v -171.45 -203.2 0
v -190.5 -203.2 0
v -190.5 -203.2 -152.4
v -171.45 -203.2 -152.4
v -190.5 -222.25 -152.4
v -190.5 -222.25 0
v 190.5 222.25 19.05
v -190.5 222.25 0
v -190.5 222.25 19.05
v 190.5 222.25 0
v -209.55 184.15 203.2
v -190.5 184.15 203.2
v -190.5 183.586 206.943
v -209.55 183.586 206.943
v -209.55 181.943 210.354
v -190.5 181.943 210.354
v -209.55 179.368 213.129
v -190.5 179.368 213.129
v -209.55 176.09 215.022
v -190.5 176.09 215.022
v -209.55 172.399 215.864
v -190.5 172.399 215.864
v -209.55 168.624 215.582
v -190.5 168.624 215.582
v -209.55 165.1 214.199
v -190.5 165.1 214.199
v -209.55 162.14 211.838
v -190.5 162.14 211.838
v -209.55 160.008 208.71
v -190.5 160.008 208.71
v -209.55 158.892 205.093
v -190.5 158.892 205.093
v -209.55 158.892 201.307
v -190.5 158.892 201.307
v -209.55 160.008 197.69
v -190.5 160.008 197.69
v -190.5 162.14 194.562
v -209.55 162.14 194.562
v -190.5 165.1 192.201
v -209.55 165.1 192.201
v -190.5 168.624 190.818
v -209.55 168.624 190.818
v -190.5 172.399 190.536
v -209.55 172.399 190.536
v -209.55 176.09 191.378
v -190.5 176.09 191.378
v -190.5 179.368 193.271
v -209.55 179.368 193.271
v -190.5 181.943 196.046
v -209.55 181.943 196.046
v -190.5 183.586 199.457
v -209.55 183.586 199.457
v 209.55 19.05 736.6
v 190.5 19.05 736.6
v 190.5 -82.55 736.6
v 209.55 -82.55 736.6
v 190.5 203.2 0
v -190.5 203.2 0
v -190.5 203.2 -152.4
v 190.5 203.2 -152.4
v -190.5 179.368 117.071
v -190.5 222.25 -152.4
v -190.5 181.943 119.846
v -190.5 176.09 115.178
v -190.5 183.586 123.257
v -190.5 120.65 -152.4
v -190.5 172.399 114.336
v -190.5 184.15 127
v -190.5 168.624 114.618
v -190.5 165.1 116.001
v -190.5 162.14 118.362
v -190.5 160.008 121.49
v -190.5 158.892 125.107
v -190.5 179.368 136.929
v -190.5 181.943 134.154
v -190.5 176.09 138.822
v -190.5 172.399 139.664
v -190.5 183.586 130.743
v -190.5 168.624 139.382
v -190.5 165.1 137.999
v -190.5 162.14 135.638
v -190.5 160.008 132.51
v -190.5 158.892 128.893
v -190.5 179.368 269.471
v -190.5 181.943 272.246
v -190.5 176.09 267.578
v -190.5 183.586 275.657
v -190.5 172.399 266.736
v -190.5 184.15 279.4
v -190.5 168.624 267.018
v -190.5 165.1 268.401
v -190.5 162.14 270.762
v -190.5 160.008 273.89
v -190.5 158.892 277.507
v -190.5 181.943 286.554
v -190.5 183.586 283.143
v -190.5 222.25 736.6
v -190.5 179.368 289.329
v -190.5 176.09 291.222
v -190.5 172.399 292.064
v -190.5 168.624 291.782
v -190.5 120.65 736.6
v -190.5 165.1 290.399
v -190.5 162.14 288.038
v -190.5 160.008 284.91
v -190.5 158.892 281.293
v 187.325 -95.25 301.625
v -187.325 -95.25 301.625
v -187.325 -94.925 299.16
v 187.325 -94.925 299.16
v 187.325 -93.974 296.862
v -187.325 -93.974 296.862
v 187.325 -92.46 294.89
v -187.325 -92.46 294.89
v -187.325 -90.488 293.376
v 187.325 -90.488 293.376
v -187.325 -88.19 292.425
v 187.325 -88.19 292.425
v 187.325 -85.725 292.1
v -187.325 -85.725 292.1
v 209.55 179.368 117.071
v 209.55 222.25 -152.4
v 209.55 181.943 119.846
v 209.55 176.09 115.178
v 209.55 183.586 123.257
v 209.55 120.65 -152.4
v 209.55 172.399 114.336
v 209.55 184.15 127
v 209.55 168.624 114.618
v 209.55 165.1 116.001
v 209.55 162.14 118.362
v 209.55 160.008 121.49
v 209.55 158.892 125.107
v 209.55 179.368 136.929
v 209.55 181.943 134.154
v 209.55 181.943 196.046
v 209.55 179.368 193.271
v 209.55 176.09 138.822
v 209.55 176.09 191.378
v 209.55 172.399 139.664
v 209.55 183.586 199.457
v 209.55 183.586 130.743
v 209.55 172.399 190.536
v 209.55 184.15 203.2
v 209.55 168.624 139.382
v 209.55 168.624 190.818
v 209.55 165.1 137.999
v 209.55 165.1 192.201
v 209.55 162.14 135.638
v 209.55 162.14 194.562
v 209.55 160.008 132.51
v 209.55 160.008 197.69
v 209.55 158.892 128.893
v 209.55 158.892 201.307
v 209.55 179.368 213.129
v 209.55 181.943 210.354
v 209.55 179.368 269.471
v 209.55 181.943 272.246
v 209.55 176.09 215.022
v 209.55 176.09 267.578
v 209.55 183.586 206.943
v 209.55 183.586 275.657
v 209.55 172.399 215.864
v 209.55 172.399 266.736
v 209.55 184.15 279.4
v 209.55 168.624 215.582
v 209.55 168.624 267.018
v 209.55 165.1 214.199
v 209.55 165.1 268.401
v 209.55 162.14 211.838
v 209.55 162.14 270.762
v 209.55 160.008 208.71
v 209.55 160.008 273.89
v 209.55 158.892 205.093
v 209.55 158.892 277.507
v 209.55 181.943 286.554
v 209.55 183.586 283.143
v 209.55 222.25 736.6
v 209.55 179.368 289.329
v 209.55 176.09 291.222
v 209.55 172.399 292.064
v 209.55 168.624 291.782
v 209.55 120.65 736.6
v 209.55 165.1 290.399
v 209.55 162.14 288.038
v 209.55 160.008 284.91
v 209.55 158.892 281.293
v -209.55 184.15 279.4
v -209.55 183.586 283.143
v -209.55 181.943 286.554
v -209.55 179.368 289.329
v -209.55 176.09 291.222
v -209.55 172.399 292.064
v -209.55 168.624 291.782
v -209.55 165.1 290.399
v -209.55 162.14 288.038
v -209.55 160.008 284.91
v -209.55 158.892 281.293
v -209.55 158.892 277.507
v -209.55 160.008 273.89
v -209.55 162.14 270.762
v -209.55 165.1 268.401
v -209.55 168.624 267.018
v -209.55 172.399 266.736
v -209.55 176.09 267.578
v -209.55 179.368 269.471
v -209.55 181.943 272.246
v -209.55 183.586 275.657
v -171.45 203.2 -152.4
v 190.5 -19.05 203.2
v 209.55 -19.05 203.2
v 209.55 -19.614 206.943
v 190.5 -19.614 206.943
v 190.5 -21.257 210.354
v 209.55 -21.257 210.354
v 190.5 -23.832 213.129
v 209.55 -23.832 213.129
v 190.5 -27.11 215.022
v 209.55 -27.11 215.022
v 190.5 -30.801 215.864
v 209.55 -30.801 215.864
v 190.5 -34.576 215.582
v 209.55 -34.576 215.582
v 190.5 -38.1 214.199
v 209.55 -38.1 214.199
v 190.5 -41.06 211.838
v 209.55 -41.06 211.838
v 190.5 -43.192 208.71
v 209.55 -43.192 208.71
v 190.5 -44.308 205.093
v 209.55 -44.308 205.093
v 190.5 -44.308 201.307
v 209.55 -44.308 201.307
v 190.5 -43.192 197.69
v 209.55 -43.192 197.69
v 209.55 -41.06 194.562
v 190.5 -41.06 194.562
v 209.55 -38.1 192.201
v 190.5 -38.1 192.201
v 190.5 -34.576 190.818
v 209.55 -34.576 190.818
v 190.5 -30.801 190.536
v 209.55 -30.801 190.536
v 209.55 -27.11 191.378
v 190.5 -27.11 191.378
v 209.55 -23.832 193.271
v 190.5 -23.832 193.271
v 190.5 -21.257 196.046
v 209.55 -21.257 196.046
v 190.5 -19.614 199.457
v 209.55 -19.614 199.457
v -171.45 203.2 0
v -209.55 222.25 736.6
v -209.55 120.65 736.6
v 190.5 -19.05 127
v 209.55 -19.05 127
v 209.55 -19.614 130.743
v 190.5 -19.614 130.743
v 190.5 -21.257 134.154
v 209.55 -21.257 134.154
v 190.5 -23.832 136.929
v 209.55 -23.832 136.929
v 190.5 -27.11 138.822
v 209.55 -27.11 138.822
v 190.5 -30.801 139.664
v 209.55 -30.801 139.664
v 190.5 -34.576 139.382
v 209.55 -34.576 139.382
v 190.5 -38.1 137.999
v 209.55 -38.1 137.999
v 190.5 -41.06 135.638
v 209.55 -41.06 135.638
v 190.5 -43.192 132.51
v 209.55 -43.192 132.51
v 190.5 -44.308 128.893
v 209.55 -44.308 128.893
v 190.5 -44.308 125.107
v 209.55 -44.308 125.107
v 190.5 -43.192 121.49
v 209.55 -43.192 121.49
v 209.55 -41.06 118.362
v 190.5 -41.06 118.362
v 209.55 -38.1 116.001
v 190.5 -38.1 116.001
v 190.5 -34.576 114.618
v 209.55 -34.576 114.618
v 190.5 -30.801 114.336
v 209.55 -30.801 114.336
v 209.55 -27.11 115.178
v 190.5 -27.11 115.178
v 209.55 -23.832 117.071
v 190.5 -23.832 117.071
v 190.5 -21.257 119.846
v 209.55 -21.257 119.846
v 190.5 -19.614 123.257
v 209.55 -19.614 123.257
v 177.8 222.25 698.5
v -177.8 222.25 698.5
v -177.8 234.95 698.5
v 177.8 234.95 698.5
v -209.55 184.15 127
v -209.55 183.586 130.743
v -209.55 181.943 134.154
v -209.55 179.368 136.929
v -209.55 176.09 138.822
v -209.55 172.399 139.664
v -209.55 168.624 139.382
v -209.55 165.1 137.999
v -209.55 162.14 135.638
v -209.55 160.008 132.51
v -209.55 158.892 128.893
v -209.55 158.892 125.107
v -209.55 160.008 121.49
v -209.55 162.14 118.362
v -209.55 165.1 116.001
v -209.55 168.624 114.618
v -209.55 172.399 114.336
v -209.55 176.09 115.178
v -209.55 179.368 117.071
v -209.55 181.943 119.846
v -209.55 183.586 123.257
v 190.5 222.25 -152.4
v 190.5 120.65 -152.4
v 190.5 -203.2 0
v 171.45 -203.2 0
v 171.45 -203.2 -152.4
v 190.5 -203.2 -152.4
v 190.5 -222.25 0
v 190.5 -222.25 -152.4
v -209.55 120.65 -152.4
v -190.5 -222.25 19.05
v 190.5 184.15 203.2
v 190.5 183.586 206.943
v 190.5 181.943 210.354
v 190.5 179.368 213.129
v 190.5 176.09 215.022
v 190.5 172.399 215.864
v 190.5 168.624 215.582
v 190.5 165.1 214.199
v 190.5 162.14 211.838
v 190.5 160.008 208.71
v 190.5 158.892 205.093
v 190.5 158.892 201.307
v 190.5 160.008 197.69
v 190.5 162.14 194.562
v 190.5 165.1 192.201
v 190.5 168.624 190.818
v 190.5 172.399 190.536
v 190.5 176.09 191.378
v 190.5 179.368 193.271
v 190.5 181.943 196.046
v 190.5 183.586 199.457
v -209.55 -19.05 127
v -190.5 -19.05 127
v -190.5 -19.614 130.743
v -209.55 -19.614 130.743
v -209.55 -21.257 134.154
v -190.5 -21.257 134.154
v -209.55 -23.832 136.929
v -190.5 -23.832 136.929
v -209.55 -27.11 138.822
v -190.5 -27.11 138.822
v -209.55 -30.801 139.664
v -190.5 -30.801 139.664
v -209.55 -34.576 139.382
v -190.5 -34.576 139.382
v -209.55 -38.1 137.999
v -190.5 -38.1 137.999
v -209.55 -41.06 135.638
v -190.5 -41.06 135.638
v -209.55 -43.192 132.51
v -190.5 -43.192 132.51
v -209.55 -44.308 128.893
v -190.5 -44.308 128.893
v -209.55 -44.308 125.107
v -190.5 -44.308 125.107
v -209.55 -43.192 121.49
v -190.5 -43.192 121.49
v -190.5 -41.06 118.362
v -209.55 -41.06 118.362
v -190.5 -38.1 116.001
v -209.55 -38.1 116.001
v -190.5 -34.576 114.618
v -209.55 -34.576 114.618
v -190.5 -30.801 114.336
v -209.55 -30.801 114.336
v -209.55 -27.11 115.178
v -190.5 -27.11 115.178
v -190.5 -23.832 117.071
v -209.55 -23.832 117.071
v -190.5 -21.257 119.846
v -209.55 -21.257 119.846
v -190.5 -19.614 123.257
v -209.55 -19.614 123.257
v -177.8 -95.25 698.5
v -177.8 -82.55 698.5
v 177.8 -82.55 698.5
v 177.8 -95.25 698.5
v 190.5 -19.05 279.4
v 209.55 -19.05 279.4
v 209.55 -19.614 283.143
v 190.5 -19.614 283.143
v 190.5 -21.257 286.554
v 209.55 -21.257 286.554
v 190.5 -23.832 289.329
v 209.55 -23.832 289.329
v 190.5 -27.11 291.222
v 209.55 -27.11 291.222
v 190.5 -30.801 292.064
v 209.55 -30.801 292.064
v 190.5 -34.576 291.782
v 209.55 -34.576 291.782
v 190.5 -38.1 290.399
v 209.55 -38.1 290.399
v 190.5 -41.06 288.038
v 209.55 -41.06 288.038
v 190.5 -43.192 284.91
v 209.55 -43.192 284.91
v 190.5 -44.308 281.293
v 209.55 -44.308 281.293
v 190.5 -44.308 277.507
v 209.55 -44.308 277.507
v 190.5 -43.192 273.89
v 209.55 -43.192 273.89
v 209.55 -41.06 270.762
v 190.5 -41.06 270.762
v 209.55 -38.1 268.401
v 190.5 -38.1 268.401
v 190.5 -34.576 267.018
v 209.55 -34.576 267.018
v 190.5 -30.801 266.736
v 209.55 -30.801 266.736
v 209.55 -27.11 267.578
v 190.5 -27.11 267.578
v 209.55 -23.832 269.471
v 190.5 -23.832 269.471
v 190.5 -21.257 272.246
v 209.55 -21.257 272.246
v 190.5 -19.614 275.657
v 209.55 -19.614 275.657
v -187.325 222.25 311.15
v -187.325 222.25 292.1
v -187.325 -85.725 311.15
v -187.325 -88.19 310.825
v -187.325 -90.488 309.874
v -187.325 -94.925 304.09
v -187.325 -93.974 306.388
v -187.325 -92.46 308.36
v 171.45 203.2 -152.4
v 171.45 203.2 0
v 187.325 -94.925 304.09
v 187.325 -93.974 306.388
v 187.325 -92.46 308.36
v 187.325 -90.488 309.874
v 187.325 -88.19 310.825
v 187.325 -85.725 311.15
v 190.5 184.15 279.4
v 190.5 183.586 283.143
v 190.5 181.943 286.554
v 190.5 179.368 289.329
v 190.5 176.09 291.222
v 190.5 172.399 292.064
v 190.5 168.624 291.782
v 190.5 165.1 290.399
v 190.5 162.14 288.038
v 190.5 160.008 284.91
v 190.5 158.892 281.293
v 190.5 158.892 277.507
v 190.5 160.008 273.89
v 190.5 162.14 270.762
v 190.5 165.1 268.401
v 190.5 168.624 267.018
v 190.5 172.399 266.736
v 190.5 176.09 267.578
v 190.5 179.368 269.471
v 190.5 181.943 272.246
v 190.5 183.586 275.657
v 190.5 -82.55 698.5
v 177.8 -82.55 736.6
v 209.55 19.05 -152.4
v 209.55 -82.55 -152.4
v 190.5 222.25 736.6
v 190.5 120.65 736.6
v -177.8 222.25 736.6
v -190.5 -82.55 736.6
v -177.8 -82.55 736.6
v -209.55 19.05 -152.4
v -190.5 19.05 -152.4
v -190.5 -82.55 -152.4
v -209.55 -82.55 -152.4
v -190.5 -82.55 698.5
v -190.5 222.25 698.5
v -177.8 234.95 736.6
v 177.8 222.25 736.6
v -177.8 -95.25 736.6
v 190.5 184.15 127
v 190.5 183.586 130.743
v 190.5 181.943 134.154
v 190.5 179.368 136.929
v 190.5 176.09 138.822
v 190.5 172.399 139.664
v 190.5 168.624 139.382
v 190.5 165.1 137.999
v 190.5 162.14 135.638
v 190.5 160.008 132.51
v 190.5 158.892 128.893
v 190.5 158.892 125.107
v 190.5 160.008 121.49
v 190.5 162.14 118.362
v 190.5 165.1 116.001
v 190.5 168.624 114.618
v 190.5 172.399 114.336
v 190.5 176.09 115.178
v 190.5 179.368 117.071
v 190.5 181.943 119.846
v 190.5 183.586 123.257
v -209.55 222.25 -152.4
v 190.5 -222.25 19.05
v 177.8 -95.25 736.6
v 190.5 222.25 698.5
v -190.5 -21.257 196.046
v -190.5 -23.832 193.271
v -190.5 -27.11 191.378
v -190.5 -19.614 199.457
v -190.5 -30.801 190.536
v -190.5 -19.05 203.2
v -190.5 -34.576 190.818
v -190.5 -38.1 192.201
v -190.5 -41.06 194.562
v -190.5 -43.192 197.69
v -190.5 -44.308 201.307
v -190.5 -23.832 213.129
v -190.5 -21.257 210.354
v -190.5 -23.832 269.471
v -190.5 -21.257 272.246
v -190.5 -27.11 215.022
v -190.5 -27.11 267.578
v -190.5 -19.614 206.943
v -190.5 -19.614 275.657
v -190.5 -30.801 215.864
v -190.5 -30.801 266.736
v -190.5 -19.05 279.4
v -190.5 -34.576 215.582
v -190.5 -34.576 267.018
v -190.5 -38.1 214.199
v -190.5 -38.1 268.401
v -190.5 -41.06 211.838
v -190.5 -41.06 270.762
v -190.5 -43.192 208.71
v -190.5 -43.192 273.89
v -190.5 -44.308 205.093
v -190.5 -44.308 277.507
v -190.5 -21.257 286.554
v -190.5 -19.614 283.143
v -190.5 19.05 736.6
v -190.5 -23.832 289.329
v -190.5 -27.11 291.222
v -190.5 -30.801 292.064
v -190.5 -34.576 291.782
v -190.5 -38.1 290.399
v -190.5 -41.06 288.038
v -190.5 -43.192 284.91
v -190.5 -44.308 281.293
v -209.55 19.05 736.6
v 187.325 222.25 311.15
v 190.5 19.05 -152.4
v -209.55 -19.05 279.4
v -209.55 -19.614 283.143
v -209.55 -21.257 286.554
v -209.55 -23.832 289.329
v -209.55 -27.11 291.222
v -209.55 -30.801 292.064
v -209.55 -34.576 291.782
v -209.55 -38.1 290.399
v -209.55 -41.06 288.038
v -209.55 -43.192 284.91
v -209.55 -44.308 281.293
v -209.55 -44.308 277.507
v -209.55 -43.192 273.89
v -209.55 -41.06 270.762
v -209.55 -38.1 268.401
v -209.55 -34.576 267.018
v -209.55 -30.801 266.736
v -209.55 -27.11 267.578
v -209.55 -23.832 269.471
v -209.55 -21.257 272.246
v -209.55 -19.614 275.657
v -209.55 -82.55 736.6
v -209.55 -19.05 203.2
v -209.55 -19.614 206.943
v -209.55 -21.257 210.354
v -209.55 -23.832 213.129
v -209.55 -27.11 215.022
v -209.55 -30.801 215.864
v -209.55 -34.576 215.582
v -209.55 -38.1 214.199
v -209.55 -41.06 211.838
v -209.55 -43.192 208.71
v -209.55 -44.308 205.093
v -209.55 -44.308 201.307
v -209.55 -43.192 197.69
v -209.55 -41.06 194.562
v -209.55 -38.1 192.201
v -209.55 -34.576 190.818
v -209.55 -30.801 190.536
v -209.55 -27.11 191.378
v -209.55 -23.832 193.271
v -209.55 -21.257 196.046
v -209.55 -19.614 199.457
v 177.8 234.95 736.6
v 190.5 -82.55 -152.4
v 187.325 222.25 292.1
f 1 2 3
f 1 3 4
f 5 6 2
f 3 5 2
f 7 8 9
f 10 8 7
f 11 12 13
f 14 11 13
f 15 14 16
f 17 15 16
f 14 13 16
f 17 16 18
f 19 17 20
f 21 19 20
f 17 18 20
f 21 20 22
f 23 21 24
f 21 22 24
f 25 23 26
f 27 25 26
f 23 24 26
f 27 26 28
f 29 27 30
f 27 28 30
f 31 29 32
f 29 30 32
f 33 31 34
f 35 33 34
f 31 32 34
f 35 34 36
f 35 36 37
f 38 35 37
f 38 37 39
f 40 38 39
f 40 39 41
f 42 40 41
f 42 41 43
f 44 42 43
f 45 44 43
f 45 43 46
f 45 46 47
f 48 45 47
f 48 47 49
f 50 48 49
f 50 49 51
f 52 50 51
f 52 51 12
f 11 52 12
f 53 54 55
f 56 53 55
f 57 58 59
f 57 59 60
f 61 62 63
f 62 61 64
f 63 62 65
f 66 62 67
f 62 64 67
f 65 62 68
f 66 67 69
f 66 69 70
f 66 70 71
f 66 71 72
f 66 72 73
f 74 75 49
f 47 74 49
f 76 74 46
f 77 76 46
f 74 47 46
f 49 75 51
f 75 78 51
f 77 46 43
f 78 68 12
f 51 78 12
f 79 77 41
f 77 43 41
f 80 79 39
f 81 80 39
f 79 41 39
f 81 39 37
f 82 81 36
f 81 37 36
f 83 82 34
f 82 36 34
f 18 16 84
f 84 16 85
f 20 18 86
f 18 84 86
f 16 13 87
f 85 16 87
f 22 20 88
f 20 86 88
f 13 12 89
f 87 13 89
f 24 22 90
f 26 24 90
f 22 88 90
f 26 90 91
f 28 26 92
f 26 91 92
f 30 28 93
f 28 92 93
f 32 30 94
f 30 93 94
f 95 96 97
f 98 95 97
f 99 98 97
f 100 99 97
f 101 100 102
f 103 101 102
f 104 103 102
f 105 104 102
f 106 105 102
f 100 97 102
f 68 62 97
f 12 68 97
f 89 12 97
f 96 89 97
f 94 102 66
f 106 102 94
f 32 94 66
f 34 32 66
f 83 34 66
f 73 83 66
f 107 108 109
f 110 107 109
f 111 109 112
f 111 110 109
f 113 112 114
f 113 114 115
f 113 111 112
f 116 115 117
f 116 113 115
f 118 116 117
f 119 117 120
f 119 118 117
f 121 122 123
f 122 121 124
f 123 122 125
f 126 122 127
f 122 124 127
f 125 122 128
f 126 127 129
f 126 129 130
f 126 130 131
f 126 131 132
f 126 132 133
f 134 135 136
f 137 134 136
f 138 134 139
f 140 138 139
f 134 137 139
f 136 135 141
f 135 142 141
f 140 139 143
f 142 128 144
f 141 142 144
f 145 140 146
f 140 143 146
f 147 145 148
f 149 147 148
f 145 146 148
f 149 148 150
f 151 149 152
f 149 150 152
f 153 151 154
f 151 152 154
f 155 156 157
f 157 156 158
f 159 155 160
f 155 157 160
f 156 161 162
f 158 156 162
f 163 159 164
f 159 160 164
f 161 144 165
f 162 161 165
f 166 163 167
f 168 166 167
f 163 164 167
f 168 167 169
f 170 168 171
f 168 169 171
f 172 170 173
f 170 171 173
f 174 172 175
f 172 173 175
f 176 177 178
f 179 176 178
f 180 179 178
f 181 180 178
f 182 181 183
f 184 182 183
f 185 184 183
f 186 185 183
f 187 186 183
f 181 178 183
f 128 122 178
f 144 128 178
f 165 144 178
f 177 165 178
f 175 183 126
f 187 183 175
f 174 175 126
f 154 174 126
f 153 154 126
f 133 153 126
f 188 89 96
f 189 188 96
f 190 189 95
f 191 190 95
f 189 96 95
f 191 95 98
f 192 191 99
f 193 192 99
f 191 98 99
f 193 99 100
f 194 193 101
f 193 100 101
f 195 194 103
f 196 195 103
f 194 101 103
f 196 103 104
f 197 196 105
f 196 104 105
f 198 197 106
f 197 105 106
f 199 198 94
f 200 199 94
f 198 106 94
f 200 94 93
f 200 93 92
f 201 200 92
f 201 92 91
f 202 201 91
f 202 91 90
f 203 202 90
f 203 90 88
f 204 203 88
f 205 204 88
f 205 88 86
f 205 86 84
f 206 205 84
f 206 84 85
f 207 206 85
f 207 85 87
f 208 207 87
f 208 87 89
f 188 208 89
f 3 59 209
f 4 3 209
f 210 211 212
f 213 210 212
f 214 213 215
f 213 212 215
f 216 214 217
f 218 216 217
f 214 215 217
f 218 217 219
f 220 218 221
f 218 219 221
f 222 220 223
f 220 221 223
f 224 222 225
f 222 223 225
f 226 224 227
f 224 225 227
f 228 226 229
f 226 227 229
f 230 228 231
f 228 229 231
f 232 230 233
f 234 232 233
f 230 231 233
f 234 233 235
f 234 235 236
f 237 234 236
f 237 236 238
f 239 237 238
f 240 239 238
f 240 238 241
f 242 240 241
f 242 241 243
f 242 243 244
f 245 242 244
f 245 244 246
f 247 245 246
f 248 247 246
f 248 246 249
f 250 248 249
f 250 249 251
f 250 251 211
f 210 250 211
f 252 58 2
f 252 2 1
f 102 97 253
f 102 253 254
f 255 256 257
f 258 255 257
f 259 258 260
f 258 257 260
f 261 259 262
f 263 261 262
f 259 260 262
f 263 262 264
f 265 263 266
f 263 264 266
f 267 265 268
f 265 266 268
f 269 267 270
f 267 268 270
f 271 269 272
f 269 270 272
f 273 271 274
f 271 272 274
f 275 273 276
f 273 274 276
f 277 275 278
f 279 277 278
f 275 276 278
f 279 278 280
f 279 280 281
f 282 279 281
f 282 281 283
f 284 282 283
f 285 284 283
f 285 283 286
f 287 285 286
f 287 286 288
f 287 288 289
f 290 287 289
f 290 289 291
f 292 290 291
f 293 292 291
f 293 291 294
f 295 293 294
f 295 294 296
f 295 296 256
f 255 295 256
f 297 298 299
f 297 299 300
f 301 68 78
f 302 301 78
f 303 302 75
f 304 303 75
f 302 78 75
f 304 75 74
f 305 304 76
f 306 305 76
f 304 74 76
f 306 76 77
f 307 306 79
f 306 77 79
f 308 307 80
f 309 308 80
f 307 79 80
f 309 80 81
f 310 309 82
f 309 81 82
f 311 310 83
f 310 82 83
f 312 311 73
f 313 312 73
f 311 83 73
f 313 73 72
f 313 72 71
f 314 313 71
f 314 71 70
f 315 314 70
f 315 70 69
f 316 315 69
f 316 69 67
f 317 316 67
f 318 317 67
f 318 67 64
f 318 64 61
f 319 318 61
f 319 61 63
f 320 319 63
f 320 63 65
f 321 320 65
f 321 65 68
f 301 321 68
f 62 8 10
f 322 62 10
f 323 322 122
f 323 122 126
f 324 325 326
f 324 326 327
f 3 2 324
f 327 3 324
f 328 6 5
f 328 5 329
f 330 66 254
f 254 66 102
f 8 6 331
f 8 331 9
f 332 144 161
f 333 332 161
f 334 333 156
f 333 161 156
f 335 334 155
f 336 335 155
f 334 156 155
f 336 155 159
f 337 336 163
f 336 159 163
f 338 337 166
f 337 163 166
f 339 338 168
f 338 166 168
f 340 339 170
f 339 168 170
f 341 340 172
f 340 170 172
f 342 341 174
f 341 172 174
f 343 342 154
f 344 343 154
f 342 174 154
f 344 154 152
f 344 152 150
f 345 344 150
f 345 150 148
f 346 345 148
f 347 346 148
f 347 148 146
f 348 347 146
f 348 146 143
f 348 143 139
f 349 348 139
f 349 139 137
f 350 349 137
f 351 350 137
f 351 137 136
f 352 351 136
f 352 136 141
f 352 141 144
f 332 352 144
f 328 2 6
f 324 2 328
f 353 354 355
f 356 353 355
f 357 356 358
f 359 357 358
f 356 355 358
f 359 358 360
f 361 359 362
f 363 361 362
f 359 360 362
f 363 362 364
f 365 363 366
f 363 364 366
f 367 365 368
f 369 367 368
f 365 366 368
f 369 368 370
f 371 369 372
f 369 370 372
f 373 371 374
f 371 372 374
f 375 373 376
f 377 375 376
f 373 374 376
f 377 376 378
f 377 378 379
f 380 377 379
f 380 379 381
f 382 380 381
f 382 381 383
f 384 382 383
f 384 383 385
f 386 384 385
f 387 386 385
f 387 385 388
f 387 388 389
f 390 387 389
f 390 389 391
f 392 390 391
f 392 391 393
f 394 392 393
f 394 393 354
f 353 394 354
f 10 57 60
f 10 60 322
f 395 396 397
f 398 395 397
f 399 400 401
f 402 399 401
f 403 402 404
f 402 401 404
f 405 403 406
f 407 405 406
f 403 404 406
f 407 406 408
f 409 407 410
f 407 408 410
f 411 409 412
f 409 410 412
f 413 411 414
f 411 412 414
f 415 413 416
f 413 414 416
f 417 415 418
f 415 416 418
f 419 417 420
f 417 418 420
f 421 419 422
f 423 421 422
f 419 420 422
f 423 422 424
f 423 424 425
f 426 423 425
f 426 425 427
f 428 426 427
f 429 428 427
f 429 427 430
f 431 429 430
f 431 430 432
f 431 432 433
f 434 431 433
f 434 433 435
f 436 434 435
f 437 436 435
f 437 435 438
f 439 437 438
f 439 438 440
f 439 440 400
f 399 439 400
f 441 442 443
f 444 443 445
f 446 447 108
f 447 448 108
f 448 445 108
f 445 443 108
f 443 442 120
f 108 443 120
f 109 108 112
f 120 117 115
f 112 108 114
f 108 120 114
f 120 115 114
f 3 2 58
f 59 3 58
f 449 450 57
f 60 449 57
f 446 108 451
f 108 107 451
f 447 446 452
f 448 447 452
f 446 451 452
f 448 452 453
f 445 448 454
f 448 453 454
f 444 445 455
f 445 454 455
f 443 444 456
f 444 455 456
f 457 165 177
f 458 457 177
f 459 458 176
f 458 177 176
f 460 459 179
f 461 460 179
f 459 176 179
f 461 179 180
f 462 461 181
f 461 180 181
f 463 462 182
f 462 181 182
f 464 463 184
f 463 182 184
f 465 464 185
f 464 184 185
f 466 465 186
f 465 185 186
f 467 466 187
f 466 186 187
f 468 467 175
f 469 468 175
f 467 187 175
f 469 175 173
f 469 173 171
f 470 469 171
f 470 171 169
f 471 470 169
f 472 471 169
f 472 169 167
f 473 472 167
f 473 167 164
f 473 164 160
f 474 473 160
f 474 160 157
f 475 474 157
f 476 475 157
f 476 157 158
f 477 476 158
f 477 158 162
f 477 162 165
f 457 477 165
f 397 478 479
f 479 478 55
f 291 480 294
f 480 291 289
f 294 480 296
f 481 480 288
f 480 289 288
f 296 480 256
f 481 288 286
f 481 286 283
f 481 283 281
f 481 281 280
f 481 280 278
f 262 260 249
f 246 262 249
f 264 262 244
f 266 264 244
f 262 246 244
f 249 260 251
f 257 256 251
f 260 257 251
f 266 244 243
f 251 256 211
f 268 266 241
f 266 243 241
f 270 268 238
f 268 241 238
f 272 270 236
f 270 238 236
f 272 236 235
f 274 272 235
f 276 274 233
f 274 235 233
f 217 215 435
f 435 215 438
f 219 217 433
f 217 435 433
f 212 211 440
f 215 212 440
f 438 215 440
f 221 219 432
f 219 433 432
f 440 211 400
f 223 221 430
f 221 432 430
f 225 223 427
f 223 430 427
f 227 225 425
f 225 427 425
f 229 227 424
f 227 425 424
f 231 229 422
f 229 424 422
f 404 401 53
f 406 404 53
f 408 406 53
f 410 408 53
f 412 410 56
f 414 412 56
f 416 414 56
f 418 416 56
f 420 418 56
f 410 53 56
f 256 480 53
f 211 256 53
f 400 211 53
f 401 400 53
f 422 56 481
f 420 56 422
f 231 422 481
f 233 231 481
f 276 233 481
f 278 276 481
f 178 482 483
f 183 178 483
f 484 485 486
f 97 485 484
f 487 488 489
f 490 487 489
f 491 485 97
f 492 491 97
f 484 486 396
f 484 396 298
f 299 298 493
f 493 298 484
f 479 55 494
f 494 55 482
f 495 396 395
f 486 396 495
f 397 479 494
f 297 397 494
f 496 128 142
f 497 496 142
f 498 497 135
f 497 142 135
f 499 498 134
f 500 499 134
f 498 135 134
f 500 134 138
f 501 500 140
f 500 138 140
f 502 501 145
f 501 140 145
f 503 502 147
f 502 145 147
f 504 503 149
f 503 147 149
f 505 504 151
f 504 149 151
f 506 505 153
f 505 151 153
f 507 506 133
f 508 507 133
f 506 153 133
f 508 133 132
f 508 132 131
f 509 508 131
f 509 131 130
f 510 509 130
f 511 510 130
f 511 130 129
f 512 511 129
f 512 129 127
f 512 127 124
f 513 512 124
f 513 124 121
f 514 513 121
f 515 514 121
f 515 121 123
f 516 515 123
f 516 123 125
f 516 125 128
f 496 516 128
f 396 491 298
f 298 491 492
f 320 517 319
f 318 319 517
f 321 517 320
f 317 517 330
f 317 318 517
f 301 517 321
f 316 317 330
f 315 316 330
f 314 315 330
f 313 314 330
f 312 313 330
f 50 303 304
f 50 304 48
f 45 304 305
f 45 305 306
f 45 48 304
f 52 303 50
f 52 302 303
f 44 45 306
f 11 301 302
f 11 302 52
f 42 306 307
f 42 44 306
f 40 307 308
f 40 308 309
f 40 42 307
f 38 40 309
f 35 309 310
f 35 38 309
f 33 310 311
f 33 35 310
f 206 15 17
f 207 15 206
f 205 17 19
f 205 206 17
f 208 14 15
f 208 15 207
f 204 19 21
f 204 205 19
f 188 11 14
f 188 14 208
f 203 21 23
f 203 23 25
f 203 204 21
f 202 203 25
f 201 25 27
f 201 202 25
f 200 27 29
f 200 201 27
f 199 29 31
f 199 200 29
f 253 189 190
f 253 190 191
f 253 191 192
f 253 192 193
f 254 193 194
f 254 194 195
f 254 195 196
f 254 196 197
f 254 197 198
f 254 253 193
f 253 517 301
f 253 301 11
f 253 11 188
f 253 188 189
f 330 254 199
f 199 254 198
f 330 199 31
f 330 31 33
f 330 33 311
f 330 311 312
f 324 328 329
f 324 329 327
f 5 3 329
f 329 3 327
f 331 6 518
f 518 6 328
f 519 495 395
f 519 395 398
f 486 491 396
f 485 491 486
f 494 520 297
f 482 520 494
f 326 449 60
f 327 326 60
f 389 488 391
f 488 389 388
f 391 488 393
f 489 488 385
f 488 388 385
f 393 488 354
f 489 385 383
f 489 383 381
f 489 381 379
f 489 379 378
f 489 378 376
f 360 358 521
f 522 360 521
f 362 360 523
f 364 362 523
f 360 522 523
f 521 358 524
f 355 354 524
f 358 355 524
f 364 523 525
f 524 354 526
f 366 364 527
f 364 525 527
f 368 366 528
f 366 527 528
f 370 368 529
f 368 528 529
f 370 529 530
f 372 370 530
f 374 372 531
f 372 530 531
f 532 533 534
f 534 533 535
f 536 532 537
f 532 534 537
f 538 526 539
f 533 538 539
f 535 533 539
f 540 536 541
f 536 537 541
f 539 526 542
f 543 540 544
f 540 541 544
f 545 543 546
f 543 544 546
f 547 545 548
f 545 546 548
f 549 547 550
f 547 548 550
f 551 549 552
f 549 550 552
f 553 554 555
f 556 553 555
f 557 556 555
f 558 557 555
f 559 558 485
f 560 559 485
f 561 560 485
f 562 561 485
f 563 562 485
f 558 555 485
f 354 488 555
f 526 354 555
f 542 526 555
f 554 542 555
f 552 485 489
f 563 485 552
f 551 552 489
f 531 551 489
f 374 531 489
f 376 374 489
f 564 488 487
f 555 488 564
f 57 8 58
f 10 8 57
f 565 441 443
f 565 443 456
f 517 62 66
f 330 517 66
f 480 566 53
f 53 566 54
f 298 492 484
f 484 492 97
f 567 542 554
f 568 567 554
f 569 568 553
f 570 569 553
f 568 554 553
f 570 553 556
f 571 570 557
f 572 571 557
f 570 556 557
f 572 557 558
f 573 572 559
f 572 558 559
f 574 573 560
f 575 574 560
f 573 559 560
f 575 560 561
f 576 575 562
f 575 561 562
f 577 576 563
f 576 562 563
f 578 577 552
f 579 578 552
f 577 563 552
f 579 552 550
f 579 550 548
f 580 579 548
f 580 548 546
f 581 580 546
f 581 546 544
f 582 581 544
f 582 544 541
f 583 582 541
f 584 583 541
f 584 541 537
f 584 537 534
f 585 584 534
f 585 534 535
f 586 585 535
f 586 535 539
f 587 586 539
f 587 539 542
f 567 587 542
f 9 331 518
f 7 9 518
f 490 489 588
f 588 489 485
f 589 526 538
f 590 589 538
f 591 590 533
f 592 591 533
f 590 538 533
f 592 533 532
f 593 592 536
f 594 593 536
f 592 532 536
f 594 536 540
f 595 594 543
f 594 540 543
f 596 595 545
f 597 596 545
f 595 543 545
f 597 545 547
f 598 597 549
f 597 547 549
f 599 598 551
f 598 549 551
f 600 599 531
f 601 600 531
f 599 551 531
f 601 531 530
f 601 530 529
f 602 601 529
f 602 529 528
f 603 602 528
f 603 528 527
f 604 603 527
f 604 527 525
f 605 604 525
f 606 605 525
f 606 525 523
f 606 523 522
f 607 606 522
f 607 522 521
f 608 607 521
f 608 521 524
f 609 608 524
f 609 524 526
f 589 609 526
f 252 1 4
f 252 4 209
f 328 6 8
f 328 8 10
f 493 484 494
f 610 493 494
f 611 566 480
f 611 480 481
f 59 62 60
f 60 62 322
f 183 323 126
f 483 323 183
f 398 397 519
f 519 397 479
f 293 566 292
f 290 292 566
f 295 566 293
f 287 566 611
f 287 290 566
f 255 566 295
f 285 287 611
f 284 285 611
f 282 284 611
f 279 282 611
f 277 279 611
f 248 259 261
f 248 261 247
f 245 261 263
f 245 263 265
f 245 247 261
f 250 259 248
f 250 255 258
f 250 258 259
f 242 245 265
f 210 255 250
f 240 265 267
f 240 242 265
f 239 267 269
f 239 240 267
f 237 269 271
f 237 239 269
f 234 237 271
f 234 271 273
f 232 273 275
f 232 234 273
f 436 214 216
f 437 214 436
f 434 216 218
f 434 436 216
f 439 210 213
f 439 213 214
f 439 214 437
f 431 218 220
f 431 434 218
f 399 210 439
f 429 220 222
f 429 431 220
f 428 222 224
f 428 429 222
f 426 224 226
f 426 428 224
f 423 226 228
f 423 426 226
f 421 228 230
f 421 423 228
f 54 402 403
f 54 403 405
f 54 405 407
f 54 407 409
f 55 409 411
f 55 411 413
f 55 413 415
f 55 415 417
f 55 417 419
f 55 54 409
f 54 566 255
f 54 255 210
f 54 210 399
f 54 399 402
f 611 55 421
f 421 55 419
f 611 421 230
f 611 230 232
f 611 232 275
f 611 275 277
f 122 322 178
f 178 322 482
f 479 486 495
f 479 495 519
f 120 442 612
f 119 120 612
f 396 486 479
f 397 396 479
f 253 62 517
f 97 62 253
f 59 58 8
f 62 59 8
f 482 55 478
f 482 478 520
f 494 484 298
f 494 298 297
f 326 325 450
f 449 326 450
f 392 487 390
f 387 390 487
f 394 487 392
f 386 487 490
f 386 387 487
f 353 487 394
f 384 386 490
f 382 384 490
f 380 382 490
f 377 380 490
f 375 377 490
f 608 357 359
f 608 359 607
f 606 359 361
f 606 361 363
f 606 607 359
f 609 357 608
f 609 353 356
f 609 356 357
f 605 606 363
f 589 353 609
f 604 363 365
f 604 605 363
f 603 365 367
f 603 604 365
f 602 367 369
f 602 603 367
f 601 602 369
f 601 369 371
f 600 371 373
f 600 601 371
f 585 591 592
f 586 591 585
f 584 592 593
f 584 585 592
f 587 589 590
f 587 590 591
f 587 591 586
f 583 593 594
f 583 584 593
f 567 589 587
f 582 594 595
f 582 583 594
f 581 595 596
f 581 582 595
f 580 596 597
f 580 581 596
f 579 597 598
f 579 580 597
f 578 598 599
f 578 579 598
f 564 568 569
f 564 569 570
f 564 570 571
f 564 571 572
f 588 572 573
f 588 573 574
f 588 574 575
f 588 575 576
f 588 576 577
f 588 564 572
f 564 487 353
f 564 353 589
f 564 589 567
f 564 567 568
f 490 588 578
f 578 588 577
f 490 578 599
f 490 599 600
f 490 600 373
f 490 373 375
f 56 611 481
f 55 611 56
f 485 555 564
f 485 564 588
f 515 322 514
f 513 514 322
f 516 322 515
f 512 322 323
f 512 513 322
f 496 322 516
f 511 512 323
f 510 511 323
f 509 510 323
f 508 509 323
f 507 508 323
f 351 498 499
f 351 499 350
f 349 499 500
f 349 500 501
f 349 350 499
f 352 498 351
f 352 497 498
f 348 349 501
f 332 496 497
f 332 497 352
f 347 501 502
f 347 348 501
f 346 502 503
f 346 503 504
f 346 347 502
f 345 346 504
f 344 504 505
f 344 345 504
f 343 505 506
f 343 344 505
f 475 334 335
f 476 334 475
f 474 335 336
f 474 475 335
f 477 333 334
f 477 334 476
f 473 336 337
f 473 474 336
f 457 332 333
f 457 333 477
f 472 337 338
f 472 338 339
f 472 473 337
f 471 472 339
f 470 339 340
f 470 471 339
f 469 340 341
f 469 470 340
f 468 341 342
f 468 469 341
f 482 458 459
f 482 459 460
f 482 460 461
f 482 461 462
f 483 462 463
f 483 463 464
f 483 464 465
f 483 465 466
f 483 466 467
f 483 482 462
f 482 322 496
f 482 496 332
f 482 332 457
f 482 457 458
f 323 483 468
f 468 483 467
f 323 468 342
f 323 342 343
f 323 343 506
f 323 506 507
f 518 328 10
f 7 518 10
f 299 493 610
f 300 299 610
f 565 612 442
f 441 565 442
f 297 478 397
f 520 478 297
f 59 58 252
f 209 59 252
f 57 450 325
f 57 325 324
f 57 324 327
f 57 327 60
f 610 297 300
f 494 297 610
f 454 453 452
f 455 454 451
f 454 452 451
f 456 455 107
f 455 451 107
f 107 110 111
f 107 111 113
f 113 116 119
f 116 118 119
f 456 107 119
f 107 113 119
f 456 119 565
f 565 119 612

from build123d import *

# Parameters (mm, degrees)
F0_W      = 381
F0_H      = 444.5
F1_DEPTH  = 19.05
F2_W      = 381
F2_H      = 19.05
F3_DEPTH  = 152.4
F4_W      = 19.05
F4_H      = 406.4
F5_DEPTH  = 152.4
F6_W      = 101.6
F6_H      = 889
F7_DEPTH  = 19.05
F10_D     = 25.4
F10_2_D   = 25.4
F10_3_D   = 25.4
F10_4_D   = 25.4
F14_DEPTH = 19.05
F15_W     = 304.8
F15_H     = 38.1
F16_DEPTH = 12.7
F18_W     = 355.6
F18_H     = 38.1
F19_DEPTH = 12.7
F23_R     = 9.52499


# Not quite as in the source:
# - a fillet or chamfer is up to 0.001 mm smaller than in the source, because OpenCascade refuses the exact size


with BuildPart() as f1:
    # F0 (on Top) → F1 (new body)
    with BuildSketch(Plane.XY):
        Rectangle(F0_W, F0_H)
    extrude(amount=F1_DEPTH)


with BuildPart() as f3:
    # F2 (on face) → F3 (new body)
    with BuildSketch(Plane.XY):
        with Locations((0, 212.725)):
            Rectangle(F2_W, F2_H)
    extrude(amount=-F3_DEPTH)


with BuildPart() as f3b:
    # F2 (on face) → F3, piece 2 (new body)
    with BuildSketch(Plane.XY):
        with Locations((0, -212.725)):
            Rectangle(F2_W, F2_H)
    extrude(amount=-F3_DEPTH)


with BuildPart() as f5:
    # F4 (on face) → F5 (new body)
    with BuildSketch(Plane.XY):
        with Locations((-180.975, 0)):
            Rectangle(F4_W, F4_H)
    extrude(amount=-F5_DEPTH)


with BuildPart() as f5b:
    # F4 (on face) → F5, piece 2 (new body)
    with BuildSketch(Plane.XY):
        with Locations((180.975, 0)):
            Rectangle(F4_W, F4_H)
    extrude(amount=-F5_DEPTH)


with BuildPart() as f7:
    # F6 (on face) → F7 (new body)
    with BuildSketch(Plane(origin=(-190.5, 0, 0), x_dir=(0, -1, 0), z_dir=(-1, 0, 0))):
        with Locations((-171.45, 292.1)):
            Rectangle(F6_W, F6_H)
    extrude(amount=F7_DEPTH)


with BuildPart() as f7b:
    # F6 (on face) → F7, piece 2 (new body)
    with BuildSketch(Plane(origin=(-190.5, 0, 0), x_dir=(0, -1, 0), z_dir=(-1, 0, 0))):
        with Locations((31.75, 292.1)):
            Rectangle(F6_W, F6_H)
    extrude(amount=F7_DEPTH)


with BuildPart() as f8_1:
    # F8: instance of F7b
    add(f7b.part.mirror(Plane.YZ))

    # F10#3 (through all)
    with Locations(Plane(origin=(-209.55, 0, 0), x_dir=(0, -1, 0), z_dir=(-1, 0, 0))):
        with Locations((-171.45, 279.4), (31.75, 279.4), (31.75, 203.2), (-171.45, 203.2), (-171.45, 127), (31.75, 127)):
            Hole(F10_3_D / 2)


with BuildPart() as f8_2:
    # F8: instance of F7
    add(f7.part.mirror(Plane.YZ))

    # F10#4 (through all)
    with Locations(Plane(origin=(-209.55, 0, 0), x_dir=(0, -1, 0), z_dir=(-1, 0, 0))):
        with Locations((-171.45, 279.4), (31.75, 279.4), (31.75, 203.2), (-171.45, 203.2), (-171.45, 127), (31.75, 127)):
            Hole(F10_4_D / 2)


with BuildPart() as f7_1:
    add(f7.part)

    # F10 (through all)
    with Locations(Plane(origin=(-209.55, 0, 0), x_dir=(0, -1, 0), z_dir=(-1, 0, 0))):
        with Locations((-171.45, 279.4), (31.75, 279.4), (31.75, 203.2), (-171.45, 203.2), (-171.45, 127), (31.75, 127)):
            Hole(F10_D / 2)


with BuildPart() as f7b_1:
    add(f7b.part)

    # F10#2 (through all)
    with Locations(Plane(origin=(-209.55, 0, 0), x_dir=(0, -1, 0), z_dir=(-1, 0, 0))):
        with Locations((-171.45, 279.4), (31.75, 279.4), (31.75, 203.2), (-171.45, 203.2), (-171.45, 127), (31.75, 127)):
            Hole(F10_2_D / 2)


with BuildPart() as f14:
    # F13 (on plane+point) → F14 (new body)
    with BuildSketch(Plane.XY.offset(292.1)):
        Polygon((-187.325, -95.25), (187.325, -95.25), (187.325, -26.0919403405), (187.325, 222.25), (-187.325, 222.25), (-187.325, -82.55), align=None)
    extrude(amount=F14_DEPTH)

    # F23 (radius 9.525 in the source; OpenCascade refuses exactly that, so slightly less here)
    f23_edges = [f14.edges().sort_by_distance(p)[0] for p in [
        (0, -95.25, 311.15),
        (0, -95.25, 292.1),
    ]]
    fillet(f23_edges, radius=F23_R)


with BuildPart() as f16:
    # F15 (on face) → F16 (new body)
    with BuildSketch(Plane.YZ.offset(-190.5)):
        with Locations((69.85, 717.55)):
            Rectangle(F15_W, F15_H)
    extrude(amount=F16_DEPTH)


with BuildPart() as f17_1:
    # F17: instance of F16
    add(f16.part.mirror(Plane.YZ))


with BuildPart() as f19:
    # F18 (on face) → F19 (new body)
    with BuildSketch(Plane.XZ.offset(82.55)):
        with Locations((0, 717.55)):
            Rectangle(F18_W, F18_H)
    extrude(amount=F19_DEPTH)


with BuildPart() as f22_1:
    # F22: instance of F19
    add(f19.part.mirror(Plane.XZ.offset(-69.85)))


solid = Compound([f1.part, f3.part, f3b.part, f5.part, f5b.part, f8_1.part, f8_2.part, f7_1.part, f7b_1.part, f14.part, f16.part, f17_1.part, f19.part, f22_1.part])
